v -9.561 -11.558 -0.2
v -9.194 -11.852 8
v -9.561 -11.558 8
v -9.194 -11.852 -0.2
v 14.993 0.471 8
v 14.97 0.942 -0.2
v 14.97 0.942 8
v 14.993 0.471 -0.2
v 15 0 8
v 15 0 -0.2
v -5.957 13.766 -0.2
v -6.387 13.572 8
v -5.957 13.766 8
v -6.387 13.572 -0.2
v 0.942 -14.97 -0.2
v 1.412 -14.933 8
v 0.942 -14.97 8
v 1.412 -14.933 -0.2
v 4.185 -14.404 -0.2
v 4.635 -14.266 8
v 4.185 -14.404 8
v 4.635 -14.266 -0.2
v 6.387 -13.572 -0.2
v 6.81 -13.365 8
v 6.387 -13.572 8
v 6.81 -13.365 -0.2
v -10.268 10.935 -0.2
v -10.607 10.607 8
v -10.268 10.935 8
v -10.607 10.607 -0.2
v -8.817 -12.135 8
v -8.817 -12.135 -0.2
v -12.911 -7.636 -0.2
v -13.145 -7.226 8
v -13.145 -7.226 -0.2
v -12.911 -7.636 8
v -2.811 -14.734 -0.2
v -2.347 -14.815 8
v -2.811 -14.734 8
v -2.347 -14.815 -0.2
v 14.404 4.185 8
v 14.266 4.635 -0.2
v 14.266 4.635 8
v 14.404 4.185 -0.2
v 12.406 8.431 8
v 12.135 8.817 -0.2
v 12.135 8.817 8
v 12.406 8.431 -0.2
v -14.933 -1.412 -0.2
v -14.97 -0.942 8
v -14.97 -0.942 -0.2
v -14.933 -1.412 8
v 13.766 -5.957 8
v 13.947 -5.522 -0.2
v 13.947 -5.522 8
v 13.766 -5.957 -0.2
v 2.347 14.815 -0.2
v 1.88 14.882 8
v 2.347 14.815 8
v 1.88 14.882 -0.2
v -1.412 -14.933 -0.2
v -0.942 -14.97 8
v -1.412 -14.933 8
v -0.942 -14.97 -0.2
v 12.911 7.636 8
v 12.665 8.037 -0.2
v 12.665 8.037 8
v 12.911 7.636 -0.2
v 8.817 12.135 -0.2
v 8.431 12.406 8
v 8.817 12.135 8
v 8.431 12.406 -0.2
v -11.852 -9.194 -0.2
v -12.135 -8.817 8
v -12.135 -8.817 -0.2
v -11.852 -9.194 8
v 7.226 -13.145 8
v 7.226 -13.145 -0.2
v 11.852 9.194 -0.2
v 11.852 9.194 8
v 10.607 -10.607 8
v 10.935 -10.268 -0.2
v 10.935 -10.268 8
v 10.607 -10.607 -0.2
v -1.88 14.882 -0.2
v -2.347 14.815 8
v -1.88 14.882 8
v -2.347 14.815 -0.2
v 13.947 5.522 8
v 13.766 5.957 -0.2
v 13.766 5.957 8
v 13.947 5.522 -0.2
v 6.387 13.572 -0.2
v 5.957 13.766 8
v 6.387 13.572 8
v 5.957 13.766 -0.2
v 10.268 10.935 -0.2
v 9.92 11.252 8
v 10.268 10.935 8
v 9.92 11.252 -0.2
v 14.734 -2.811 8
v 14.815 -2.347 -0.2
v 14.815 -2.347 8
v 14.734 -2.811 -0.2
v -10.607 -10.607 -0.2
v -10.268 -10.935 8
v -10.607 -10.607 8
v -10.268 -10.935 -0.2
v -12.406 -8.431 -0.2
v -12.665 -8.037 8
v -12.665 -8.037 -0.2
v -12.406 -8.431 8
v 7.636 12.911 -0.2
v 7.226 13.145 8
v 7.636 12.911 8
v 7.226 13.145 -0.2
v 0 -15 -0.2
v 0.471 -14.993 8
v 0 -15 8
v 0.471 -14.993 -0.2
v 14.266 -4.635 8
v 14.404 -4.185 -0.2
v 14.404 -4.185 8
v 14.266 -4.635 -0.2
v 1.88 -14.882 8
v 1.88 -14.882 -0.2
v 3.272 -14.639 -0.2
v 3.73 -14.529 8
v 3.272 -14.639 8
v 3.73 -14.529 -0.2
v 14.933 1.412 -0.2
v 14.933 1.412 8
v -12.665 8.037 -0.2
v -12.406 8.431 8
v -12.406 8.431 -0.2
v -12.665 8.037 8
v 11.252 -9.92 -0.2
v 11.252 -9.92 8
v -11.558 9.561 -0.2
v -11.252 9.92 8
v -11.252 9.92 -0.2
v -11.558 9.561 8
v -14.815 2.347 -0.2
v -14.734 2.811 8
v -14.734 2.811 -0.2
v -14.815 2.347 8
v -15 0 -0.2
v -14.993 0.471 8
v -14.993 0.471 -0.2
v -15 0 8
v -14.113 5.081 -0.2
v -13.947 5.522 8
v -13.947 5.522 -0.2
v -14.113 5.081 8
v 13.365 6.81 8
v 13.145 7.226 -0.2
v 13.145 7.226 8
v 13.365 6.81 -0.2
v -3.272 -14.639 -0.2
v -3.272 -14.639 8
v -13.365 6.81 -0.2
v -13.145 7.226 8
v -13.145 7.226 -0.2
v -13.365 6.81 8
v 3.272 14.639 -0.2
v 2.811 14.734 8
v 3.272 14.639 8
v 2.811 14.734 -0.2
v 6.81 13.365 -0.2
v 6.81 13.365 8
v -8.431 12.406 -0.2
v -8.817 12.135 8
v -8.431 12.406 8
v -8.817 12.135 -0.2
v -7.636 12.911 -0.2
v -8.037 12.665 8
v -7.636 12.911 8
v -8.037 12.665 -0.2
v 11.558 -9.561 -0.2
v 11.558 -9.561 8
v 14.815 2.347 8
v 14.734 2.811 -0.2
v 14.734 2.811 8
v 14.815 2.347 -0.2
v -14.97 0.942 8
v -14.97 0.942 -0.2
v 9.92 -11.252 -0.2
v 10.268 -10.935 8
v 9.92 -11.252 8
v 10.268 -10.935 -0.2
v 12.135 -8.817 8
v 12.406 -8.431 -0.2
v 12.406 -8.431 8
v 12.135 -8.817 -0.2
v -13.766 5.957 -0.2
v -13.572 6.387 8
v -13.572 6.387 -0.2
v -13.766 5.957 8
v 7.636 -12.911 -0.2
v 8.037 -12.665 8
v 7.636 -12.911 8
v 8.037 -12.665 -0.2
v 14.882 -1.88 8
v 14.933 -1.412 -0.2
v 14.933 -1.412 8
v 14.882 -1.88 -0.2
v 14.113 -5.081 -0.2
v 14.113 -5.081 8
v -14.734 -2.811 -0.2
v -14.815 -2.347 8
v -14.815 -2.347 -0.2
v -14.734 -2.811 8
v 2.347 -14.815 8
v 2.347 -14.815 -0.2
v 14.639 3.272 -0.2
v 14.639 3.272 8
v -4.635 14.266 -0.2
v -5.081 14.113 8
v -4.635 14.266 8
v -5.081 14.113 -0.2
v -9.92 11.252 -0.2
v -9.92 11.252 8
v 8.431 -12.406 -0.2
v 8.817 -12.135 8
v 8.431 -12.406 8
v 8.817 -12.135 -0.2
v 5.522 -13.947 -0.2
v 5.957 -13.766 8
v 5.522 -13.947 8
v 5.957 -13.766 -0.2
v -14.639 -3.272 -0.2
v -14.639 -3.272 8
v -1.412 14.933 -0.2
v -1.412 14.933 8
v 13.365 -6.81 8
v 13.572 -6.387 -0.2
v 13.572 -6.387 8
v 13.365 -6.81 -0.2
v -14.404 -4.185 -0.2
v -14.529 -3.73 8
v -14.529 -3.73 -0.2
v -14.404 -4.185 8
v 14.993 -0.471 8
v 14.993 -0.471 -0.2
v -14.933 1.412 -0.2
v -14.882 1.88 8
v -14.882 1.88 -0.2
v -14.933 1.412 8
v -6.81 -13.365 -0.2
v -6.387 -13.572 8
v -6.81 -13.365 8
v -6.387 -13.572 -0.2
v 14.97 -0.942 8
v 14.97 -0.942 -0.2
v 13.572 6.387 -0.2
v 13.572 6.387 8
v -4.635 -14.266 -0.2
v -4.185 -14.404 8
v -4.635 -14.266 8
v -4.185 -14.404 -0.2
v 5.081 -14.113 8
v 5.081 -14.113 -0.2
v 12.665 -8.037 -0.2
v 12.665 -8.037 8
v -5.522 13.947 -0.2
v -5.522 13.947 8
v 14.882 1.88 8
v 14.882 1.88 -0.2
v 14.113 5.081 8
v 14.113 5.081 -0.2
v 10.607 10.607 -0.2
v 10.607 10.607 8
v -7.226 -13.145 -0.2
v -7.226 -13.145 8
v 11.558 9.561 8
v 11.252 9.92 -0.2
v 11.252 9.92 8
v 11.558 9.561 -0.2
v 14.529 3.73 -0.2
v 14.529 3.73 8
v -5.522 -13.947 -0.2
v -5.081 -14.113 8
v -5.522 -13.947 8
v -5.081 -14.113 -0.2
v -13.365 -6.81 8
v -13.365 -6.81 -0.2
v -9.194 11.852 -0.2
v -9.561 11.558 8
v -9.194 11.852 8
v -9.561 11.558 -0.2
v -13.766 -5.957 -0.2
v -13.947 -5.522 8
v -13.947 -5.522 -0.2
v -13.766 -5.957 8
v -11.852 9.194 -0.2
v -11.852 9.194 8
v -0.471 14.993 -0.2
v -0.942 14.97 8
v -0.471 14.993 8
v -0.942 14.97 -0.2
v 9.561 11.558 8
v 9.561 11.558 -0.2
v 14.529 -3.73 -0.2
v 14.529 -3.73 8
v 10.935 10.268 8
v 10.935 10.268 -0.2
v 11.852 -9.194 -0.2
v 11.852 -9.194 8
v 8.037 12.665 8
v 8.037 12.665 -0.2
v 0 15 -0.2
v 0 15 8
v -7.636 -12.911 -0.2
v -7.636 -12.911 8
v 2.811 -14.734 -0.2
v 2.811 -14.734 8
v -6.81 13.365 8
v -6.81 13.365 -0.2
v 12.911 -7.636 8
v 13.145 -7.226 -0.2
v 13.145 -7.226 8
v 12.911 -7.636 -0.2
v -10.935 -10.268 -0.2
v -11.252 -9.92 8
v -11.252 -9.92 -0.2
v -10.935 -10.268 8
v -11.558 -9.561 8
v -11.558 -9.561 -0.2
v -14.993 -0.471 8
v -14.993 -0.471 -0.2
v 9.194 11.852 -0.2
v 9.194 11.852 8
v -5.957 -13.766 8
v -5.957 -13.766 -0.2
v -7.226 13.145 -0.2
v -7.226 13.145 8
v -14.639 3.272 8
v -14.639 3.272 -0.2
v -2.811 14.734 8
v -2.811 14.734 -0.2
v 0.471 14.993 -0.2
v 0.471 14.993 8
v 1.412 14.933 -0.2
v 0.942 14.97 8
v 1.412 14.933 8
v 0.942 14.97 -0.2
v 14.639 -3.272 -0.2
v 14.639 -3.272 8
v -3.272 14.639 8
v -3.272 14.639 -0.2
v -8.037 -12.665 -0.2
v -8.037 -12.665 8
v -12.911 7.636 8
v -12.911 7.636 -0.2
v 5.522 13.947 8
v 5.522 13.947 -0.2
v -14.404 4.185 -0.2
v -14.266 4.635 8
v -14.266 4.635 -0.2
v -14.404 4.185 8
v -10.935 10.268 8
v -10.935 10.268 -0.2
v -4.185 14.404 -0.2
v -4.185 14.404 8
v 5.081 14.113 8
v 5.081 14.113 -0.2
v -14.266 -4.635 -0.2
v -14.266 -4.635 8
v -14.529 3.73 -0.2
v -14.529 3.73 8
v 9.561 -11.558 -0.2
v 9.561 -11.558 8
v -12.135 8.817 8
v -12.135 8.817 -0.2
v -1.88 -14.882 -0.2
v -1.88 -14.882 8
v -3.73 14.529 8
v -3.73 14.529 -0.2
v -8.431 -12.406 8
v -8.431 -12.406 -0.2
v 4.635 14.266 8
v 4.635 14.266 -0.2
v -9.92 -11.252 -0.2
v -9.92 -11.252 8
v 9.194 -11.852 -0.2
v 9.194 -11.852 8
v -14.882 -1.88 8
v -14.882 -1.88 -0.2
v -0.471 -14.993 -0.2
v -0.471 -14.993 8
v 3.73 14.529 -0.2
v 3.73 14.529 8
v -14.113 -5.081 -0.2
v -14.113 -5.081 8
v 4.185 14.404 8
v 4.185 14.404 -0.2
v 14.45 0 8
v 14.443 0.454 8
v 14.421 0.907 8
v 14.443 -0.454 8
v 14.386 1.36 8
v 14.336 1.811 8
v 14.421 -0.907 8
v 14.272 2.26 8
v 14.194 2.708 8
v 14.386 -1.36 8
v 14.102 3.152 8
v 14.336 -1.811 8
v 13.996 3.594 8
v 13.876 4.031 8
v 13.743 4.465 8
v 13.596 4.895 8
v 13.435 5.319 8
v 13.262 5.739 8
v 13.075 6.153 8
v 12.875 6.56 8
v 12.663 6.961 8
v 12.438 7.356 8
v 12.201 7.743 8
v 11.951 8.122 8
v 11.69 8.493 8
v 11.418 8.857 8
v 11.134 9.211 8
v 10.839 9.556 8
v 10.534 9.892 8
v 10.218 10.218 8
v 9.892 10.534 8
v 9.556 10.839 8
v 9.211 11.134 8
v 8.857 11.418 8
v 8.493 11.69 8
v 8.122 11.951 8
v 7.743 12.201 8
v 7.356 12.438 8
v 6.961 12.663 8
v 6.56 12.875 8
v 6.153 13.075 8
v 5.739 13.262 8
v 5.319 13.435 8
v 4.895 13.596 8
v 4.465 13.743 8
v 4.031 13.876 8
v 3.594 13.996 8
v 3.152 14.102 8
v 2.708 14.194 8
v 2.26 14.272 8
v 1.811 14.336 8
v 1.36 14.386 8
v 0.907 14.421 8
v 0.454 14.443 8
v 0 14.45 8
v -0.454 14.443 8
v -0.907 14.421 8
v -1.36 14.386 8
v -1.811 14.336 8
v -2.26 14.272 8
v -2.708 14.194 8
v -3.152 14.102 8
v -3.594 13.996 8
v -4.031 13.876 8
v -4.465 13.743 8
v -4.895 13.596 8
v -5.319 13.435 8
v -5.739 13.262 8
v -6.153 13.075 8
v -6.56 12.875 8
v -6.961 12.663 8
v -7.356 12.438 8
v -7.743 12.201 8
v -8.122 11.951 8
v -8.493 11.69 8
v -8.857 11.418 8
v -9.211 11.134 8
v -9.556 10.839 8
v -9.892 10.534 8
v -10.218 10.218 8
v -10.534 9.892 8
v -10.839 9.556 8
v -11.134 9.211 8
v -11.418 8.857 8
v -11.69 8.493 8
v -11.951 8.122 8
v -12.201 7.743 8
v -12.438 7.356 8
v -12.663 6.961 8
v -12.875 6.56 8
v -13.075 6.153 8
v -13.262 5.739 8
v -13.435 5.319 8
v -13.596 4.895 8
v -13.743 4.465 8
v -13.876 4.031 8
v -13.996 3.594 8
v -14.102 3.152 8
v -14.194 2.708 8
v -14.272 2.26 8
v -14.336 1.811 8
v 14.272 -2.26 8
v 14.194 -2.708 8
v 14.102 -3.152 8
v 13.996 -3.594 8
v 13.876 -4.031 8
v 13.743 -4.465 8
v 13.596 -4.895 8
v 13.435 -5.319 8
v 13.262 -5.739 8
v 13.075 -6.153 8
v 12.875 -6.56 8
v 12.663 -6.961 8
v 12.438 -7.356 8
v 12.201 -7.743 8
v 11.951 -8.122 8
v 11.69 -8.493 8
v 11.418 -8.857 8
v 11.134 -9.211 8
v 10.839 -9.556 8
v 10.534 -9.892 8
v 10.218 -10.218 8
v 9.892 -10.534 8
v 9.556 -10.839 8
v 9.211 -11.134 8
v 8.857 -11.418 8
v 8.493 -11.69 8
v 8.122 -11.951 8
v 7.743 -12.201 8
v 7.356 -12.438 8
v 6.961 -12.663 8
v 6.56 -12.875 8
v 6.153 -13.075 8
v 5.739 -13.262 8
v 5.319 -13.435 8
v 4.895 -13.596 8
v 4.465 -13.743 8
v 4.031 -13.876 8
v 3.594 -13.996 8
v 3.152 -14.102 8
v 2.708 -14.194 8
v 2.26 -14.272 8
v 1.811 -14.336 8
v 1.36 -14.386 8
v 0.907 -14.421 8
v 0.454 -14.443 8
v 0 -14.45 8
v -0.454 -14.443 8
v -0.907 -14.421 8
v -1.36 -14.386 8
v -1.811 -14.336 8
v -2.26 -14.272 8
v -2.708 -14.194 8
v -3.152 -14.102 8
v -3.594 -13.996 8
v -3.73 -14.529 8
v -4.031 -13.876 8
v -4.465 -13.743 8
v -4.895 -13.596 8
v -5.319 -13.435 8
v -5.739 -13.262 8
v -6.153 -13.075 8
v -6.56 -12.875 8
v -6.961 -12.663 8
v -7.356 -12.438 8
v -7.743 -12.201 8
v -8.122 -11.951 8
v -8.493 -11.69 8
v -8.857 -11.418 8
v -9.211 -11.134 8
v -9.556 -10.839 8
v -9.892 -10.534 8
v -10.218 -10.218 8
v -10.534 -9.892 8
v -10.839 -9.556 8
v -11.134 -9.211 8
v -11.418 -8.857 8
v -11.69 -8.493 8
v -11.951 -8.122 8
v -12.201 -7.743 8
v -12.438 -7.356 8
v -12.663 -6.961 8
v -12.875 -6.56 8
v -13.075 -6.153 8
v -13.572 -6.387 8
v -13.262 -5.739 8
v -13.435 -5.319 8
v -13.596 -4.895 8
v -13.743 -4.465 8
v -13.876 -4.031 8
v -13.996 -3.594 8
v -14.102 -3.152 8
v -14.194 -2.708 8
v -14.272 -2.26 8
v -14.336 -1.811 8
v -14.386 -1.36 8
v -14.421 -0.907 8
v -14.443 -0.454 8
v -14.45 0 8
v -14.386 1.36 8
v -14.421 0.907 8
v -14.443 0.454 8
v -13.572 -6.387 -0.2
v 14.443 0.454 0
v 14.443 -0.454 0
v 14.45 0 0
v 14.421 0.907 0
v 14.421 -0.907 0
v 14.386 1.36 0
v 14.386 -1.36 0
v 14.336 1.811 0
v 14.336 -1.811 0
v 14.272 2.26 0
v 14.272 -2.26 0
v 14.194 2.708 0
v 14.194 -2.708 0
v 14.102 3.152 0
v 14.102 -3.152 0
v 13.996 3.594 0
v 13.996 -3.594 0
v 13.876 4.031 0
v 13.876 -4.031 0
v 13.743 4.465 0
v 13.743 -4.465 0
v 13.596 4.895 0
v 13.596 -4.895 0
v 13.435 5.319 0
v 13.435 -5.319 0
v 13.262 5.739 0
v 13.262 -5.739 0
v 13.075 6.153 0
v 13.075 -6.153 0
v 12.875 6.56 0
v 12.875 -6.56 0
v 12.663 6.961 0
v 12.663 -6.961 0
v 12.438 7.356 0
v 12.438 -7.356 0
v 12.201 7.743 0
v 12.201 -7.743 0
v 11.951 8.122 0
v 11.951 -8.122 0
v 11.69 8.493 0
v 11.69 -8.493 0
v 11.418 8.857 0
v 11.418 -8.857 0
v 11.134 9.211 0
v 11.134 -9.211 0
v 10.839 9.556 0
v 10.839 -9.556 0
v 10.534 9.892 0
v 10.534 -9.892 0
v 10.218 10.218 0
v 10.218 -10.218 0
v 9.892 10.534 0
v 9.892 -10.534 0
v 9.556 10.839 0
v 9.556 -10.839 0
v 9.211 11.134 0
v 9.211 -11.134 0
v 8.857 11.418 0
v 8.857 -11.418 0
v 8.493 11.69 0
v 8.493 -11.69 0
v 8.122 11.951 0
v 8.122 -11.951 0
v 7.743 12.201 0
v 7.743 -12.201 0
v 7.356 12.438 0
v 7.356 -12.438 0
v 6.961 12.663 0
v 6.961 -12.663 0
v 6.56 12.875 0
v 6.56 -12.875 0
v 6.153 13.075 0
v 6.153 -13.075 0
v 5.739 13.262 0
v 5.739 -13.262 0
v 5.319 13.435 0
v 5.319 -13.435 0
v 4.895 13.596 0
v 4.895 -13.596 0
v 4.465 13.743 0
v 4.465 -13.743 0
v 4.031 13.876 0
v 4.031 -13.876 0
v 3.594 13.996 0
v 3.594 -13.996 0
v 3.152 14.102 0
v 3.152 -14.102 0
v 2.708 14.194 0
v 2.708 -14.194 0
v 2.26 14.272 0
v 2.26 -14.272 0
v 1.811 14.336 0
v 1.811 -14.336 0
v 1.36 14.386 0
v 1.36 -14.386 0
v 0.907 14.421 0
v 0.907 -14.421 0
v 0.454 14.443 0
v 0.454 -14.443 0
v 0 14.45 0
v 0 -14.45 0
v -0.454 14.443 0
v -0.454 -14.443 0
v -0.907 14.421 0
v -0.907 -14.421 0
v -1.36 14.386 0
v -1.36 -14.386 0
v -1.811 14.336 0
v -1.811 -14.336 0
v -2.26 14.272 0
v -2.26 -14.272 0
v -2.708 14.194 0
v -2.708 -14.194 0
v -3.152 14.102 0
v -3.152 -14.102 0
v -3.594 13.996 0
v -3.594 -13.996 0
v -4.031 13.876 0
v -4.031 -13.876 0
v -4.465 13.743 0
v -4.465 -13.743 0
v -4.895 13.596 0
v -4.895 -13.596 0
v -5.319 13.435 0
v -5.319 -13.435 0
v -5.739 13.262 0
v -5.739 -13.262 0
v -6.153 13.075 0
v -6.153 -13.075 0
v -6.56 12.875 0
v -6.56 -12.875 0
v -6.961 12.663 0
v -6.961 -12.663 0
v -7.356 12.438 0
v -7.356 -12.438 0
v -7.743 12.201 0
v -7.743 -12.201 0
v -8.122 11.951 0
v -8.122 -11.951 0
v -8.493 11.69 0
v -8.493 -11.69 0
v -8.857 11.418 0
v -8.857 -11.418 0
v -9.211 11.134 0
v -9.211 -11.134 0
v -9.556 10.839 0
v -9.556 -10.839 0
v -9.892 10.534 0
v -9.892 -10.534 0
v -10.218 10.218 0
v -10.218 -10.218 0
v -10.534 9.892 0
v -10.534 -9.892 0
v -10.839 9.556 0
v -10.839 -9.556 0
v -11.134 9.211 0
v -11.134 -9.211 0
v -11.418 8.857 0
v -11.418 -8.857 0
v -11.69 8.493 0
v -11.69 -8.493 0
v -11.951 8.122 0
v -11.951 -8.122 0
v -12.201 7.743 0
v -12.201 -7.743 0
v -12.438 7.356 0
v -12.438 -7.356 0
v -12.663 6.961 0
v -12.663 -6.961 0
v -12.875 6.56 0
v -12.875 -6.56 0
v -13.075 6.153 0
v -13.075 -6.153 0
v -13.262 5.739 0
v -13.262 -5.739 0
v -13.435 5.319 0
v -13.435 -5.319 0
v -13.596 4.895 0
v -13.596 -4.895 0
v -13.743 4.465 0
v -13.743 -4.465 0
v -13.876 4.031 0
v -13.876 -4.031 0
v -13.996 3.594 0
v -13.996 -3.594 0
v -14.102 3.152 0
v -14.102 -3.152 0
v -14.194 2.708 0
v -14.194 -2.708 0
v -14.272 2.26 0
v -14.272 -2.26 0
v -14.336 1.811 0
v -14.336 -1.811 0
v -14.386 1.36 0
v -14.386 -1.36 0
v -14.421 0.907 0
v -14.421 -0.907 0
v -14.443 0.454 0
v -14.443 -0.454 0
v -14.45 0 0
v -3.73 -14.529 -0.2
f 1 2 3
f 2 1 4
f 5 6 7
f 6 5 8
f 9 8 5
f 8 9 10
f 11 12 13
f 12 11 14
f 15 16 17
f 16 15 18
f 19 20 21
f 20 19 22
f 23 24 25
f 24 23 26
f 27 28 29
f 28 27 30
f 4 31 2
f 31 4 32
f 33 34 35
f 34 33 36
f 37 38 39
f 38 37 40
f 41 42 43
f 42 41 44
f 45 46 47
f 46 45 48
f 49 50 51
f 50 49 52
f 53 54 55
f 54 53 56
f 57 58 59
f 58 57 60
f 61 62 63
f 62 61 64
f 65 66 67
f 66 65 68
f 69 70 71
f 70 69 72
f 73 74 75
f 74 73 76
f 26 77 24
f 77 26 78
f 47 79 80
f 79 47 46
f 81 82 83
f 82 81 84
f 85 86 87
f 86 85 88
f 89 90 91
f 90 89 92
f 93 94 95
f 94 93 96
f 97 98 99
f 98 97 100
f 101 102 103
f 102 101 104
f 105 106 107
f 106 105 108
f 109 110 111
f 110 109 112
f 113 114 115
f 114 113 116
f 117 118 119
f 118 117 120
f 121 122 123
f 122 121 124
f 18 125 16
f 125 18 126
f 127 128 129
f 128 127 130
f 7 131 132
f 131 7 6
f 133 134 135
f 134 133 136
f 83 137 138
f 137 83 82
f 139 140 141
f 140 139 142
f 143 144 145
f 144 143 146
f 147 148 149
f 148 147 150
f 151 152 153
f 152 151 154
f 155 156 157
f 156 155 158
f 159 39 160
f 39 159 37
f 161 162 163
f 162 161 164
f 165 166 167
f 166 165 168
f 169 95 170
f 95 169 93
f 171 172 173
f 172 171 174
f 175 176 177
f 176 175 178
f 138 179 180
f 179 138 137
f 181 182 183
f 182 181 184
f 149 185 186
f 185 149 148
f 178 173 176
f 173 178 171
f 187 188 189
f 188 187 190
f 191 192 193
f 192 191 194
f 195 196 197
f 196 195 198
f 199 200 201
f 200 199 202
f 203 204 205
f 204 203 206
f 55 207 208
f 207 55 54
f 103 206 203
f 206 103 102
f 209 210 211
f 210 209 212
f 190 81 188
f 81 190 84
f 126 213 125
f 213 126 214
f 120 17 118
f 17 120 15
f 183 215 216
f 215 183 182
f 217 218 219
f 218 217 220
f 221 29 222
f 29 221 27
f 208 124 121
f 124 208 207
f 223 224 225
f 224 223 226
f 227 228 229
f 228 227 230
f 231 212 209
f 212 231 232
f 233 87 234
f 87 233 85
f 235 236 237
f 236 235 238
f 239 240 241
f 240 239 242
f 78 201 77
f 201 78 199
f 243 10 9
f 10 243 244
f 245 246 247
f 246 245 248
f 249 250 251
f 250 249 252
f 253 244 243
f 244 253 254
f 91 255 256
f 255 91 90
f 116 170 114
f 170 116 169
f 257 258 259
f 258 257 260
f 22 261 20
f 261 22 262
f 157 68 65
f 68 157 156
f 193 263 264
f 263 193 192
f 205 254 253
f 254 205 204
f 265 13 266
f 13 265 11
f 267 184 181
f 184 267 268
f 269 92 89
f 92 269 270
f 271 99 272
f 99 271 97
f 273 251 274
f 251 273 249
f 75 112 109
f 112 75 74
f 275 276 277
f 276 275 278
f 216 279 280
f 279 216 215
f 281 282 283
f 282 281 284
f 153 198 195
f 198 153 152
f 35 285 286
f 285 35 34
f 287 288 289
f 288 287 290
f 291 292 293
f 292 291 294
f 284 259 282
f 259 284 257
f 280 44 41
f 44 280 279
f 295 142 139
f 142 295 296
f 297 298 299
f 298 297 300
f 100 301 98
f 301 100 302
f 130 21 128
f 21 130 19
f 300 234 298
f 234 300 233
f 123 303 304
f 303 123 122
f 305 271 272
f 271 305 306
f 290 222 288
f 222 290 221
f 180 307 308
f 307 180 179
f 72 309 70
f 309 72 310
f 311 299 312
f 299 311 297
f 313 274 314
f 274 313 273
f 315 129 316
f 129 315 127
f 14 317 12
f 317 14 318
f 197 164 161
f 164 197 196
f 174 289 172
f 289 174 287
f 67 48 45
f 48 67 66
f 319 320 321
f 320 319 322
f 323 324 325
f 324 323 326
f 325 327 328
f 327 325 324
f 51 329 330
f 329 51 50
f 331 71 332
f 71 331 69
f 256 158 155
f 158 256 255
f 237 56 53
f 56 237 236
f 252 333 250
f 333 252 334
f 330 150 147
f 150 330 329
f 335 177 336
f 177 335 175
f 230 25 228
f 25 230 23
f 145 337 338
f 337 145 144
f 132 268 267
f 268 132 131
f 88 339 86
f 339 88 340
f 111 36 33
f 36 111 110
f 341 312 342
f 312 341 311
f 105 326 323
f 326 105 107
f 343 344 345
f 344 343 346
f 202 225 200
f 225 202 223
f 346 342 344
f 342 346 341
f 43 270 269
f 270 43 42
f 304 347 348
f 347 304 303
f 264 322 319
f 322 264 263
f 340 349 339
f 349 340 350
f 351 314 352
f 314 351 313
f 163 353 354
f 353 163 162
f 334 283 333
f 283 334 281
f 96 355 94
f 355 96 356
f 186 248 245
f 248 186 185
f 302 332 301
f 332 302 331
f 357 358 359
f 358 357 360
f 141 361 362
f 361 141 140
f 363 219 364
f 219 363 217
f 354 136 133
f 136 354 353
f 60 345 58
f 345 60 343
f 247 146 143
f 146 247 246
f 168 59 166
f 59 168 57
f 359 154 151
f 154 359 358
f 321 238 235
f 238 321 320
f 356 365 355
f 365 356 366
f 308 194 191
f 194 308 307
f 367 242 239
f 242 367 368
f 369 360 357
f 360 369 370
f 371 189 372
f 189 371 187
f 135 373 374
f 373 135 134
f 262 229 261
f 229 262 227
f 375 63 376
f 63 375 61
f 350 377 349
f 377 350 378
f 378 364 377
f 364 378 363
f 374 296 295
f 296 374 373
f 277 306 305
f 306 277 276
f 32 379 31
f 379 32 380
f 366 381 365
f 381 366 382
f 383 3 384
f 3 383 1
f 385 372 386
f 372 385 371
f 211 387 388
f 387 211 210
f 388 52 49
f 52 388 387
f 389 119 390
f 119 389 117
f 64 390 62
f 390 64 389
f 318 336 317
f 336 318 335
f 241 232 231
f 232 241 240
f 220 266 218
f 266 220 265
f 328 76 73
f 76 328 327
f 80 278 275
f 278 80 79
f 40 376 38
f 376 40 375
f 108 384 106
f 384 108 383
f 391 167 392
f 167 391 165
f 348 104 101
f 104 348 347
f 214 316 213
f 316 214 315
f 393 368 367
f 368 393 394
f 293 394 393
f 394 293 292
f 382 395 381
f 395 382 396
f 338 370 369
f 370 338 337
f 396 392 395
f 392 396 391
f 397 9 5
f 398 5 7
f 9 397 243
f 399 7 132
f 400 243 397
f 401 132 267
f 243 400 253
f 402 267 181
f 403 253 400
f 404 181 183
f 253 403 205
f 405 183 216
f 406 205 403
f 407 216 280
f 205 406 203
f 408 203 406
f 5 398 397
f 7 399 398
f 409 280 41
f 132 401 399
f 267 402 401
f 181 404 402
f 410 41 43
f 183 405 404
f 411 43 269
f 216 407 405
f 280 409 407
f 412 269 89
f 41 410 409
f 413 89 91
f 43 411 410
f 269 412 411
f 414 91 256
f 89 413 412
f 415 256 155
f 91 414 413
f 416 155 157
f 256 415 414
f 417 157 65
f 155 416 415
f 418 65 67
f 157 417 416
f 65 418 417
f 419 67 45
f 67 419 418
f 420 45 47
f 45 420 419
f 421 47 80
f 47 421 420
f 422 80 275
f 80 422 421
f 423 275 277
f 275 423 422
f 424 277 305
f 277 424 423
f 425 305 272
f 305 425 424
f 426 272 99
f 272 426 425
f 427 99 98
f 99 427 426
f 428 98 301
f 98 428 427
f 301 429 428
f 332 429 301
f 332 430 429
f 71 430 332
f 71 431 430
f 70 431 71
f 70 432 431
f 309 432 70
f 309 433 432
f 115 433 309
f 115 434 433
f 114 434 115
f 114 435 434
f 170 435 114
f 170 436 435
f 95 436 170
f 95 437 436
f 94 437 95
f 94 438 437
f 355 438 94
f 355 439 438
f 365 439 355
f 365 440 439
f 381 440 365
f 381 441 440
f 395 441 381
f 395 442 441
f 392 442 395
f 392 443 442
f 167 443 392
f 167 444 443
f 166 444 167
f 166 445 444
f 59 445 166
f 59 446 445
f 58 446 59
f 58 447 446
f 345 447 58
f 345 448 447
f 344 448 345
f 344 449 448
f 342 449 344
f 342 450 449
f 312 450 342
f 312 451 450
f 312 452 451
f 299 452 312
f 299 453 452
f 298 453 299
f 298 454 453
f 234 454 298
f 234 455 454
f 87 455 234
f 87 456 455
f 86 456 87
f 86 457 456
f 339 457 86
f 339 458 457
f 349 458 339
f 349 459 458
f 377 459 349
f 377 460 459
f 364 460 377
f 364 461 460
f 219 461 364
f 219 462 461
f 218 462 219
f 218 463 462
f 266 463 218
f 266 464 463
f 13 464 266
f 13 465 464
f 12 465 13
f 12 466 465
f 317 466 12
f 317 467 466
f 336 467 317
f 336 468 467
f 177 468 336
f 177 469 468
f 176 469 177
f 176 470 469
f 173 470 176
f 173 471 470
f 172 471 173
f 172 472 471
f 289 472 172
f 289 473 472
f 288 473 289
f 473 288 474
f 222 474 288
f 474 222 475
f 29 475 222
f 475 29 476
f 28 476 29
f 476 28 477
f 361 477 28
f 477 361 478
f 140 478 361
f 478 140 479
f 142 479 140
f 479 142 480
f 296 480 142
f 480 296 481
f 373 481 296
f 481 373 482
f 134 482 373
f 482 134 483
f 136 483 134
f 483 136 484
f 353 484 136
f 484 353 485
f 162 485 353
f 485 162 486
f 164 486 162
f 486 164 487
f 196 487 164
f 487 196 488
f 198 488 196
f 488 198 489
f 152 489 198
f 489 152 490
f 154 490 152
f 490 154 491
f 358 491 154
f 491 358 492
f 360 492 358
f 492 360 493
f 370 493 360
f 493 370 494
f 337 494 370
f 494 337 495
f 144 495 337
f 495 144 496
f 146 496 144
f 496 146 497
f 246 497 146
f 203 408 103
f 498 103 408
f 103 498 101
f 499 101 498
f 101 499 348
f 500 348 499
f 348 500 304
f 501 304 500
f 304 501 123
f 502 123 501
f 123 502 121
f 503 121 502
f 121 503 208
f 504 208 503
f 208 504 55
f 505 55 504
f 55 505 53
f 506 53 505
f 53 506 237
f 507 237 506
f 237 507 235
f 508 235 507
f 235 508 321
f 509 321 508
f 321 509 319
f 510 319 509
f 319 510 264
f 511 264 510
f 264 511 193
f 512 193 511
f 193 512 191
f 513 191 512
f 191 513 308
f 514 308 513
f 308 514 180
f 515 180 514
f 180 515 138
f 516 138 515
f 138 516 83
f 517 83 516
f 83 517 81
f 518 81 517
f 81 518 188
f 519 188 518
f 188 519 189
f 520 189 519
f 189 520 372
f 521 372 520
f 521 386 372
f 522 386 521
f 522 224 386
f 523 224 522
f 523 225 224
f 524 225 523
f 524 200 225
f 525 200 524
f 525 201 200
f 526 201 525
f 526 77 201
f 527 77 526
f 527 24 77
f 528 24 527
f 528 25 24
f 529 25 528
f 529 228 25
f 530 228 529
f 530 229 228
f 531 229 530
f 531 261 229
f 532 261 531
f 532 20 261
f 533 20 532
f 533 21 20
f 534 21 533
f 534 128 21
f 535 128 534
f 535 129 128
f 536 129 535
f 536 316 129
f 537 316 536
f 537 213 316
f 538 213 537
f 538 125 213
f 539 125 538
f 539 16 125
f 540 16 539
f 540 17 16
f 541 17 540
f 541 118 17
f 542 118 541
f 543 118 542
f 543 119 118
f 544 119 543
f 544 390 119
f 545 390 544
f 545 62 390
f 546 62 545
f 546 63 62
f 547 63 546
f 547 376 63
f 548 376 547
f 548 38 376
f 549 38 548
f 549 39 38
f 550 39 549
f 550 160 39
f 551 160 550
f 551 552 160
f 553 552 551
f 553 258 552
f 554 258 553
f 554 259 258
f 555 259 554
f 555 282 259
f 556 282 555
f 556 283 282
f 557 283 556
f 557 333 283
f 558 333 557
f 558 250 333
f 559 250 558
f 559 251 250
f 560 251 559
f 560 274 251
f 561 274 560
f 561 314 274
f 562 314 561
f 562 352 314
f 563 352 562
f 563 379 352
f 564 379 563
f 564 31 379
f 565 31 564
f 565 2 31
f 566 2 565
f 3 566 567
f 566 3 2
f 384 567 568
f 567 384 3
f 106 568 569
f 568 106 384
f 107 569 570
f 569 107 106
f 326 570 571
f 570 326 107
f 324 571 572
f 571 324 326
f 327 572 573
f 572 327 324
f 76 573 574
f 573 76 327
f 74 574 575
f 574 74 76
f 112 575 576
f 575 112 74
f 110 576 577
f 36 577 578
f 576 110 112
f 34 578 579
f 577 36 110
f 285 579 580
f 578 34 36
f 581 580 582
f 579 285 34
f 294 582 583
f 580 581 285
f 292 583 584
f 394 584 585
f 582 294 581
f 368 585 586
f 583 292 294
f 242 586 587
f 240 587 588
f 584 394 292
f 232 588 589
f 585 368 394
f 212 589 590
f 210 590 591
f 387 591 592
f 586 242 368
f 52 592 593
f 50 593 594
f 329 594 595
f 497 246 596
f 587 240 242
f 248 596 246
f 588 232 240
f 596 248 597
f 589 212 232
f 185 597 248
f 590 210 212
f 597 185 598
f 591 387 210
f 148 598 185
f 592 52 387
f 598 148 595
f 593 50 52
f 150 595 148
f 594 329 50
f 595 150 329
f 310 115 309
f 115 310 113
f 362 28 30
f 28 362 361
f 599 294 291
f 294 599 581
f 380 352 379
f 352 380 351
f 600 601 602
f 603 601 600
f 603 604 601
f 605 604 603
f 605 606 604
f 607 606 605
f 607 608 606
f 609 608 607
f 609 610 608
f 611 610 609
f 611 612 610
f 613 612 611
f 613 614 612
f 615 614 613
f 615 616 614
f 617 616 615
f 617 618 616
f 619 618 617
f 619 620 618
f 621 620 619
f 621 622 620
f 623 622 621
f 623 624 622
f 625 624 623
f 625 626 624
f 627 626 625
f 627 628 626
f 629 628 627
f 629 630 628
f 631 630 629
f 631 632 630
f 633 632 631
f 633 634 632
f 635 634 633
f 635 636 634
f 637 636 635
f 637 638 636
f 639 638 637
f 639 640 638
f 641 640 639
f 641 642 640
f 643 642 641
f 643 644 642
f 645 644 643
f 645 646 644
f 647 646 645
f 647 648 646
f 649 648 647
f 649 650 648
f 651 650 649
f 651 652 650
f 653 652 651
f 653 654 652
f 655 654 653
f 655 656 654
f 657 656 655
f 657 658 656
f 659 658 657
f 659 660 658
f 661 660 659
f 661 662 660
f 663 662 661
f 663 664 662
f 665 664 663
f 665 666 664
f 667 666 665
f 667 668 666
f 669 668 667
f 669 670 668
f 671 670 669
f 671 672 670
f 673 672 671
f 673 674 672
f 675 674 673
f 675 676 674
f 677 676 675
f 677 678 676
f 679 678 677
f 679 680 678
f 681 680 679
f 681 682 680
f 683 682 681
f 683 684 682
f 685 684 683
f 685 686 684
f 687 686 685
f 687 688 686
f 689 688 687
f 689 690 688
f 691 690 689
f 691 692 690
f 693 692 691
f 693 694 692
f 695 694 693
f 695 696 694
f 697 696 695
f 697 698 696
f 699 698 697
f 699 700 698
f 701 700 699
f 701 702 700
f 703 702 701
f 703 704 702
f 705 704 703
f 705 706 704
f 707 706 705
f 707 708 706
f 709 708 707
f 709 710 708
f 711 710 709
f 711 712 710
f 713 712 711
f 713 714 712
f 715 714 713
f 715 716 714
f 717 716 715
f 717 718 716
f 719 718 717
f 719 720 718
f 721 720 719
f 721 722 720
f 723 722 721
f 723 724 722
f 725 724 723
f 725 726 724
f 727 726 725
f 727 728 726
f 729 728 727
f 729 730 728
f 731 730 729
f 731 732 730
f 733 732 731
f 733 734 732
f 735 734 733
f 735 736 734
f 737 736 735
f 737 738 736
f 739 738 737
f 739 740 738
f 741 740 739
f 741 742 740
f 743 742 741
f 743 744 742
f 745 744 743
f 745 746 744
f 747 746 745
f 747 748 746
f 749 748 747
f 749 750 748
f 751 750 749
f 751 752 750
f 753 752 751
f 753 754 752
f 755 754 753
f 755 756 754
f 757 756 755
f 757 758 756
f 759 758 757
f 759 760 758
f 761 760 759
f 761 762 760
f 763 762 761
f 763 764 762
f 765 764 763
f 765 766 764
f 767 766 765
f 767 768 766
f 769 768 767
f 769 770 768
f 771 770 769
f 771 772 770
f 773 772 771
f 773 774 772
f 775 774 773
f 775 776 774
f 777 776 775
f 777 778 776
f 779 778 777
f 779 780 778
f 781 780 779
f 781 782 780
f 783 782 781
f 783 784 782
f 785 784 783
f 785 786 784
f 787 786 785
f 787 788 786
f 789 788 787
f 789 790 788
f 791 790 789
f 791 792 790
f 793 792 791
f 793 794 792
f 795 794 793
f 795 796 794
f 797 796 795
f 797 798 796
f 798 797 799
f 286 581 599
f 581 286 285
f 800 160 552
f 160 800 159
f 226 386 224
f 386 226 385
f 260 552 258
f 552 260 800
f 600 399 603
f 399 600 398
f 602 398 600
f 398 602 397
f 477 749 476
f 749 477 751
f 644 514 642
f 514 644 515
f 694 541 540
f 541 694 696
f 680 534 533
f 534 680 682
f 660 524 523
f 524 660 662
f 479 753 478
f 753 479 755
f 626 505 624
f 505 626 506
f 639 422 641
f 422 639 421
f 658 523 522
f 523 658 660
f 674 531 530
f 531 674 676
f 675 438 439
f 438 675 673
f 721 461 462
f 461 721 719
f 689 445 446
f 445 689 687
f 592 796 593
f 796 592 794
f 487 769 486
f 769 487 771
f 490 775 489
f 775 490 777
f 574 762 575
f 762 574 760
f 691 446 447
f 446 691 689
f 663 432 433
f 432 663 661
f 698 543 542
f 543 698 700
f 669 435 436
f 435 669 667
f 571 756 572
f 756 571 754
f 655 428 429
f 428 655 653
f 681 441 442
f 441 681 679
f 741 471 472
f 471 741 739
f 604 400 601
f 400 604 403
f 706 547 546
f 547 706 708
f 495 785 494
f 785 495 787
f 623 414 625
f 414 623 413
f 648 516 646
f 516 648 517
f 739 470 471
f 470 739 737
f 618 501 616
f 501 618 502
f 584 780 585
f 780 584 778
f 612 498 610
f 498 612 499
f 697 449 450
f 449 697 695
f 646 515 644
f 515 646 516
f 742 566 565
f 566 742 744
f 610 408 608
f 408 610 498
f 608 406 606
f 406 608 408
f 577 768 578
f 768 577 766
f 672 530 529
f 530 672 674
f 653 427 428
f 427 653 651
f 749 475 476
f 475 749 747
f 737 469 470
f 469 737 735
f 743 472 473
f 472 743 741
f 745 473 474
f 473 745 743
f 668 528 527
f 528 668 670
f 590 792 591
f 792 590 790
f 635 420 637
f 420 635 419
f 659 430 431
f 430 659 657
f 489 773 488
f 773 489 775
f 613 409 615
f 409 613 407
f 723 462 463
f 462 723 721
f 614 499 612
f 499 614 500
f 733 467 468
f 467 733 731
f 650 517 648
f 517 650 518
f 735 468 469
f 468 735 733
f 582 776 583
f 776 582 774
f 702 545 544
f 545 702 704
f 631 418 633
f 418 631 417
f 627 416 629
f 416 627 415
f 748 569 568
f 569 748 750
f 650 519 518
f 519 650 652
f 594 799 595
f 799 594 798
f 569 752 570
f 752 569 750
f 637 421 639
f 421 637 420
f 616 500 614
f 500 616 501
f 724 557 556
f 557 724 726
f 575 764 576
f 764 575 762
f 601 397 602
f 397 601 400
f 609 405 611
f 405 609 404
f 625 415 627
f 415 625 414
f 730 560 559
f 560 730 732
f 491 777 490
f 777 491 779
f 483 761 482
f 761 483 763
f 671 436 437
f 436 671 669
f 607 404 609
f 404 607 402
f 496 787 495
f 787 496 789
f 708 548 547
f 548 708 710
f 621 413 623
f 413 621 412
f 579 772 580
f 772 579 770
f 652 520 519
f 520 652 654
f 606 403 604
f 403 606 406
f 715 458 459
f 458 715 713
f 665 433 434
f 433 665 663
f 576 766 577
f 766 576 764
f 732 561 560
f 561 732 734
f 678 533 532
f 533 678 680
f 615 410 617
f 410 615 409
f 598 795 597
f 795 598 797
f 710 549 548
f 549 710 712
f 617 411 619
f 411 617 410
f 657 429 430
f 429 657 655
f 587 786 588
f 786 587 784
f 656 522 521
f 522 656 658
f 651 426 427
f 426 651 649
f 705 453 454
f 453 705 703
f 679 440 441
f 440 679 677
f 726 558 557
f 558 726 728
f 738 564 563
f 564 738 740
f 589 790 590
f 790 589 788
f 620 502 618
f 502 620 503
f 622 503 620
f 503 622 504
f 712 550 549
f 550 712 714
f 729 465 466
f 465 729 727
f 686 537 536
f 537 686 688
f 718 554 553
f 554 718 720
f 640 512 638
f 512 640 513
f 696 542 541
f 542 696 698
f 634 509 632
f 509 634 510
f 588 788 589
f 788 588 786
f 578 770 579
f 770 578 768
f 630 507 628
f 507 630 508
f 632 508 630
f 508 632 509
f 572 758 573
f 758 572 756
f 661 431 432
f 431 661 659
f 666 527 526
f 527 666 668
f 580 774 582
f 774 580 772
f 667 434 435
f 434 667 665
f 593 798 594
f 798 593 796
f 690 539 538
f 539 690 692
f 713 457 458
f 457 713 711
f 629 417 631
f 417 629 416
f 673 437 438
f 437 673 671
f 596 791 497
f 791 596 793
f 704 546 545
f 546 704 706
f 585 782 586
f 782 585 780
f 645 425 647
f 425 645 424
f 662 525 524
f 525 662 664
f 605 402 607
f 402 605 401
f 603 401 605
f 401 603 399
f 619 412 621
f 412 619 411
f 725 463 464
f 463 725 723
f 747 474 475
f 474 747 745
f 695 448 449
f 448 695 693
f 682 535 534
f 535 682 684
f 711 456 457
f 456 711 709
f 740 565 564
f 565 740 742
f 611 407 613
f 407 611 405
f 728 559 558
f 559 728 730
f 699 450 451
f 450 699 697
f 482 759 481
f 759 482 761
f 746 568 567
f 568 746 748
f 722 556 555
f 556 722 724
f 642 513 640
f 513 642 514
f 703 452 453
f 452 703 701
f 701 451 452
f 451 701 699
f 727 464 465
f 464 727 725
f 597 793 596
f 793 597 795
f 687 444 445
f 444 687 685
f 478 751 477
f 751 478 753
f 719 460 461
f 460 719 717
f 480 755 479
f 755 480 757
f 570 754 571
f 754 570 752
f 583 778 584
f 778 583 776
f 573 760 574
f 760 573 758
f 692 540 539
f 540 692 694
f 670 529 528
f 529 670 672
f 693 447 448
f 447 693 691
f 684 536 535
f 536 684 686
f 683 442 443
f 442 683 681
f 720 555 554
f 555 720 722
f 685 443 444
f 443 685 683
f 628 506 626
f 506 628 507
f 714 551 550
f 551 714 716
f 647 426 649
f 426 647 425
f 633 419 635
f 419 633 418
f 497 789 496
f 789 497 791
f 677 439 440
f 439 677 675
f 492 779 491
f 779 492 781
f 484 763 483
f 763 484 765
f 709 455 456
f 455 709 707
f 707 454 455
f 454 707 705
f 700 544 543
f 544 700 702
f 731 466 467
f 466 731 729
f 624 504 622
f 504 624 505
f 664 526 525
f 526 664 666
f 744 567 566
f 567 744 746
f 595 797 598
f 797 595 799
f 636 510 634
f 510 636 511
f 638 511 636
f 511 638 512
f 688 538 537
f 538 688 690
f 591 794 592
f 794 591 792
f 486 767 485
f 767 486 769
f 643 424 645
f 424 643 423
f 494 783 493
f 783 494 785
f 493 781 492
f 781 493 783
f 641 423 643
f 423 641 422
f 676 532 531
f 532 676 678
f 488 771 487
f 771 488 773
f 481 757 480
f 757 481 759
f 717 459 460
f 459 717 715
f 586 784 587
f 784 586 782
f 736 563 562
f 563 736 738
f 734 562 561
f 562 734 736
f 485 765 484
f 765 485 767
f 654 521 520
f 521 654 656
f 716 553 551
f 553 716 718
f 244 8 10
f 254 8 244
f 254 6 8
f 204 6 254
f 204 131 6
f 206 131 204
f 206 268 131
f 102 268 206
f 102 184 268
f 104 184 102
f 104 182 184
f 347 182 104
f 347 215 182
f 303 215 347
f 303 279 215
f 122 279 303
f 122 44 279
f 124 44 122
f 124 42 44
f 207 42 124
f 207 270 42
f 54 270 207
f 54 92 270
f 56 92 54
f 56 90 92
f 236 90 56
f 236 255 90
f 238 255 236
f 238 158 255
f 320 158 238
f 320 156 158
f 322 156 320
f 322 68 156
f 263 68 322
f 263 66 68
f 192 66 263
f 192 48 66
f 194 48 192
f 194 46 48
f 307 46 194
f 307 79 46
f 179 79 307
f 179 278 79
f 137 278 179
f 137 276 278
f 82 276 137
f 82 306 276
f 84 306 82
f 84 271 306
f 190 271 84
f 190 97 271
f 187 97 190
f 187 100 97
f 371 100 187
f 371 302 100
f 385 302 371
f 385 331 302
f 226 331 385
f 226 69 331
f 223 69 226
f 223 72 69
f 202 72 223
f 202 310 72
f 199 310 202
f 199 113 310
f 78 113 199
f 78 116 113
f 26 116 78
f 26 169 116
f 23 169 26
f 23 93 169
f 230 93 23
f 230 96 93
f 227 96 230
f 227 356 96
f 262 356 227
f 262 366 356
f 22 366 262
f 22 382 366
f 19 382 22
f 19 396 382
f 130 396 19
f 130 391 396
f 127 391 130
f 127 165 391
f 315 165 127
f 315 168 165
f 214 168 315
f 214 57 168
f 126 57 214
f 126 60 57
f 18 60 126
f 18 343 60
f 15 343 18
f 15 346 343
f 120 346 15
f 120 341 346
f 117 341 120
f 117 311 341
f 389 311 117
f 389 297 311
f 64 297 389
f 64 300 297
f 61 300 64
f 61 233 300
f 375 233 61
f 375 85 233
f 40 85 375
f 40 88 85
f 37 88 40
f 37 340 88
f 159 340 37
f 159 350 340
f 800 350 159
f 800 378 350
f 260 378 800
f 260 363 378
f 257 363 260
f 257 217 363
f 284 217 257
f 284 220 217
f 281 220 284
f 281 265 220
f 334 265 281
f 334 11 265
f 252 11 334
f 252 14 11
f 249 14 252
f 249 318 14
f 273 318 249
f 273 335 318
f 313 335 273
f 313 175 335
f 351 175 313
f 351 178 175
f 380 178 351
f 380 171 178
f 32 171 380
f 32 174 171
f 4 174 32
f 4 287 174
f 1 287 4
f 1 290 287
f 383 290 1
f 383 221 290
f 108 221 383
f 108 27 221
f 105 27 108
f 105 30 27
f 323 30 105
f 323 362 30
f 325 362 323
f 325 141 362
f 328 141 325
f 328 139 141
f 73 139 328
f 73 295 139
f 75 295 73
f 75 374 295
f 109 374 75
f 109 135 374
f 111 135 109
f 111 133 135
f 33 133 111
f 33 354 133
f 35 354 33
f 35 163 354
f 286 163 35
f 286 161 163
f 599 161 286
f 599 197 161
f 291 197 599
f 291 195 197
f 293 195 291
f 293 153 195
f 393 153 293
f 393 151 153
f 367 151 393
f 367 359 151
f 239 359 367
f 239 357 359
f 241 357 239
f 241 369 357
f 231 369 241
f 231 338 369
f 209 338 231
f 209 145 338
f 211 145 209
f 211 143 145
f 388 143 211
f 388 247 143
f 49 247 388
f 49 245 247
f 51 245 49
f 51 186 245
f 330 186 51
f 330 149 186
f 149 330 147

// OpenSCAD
// [FL_INDEX: keywords="openscad, 3d_parametric, Single_Wall_Cylinder__customizer, csg_solid" | COT="Parametric OpenSCAD design from 3DCodeverse"]
// Title: Single Wall Cylinder (customizer)

//Diameter of cylinder
diameter=30;
//Width of single wall layer
extrusionWidth=0.55;
//Height of cylinder
height=8;
//Height/thickness of bottom (0 for no bottom)
layerHeight=0.2;


/* [hidden] */
rad=diameter/2;
$fn=200;

union() {
translate([0,0,-layerHeight]) cylinder(r=rad, h=layerHeight);
	difference () {
		cylinder(r=rad, h=height);
		translate([0,0,-1])
		cylinder(r=rad-extrusionWidth, h=height+2);
	}
}
